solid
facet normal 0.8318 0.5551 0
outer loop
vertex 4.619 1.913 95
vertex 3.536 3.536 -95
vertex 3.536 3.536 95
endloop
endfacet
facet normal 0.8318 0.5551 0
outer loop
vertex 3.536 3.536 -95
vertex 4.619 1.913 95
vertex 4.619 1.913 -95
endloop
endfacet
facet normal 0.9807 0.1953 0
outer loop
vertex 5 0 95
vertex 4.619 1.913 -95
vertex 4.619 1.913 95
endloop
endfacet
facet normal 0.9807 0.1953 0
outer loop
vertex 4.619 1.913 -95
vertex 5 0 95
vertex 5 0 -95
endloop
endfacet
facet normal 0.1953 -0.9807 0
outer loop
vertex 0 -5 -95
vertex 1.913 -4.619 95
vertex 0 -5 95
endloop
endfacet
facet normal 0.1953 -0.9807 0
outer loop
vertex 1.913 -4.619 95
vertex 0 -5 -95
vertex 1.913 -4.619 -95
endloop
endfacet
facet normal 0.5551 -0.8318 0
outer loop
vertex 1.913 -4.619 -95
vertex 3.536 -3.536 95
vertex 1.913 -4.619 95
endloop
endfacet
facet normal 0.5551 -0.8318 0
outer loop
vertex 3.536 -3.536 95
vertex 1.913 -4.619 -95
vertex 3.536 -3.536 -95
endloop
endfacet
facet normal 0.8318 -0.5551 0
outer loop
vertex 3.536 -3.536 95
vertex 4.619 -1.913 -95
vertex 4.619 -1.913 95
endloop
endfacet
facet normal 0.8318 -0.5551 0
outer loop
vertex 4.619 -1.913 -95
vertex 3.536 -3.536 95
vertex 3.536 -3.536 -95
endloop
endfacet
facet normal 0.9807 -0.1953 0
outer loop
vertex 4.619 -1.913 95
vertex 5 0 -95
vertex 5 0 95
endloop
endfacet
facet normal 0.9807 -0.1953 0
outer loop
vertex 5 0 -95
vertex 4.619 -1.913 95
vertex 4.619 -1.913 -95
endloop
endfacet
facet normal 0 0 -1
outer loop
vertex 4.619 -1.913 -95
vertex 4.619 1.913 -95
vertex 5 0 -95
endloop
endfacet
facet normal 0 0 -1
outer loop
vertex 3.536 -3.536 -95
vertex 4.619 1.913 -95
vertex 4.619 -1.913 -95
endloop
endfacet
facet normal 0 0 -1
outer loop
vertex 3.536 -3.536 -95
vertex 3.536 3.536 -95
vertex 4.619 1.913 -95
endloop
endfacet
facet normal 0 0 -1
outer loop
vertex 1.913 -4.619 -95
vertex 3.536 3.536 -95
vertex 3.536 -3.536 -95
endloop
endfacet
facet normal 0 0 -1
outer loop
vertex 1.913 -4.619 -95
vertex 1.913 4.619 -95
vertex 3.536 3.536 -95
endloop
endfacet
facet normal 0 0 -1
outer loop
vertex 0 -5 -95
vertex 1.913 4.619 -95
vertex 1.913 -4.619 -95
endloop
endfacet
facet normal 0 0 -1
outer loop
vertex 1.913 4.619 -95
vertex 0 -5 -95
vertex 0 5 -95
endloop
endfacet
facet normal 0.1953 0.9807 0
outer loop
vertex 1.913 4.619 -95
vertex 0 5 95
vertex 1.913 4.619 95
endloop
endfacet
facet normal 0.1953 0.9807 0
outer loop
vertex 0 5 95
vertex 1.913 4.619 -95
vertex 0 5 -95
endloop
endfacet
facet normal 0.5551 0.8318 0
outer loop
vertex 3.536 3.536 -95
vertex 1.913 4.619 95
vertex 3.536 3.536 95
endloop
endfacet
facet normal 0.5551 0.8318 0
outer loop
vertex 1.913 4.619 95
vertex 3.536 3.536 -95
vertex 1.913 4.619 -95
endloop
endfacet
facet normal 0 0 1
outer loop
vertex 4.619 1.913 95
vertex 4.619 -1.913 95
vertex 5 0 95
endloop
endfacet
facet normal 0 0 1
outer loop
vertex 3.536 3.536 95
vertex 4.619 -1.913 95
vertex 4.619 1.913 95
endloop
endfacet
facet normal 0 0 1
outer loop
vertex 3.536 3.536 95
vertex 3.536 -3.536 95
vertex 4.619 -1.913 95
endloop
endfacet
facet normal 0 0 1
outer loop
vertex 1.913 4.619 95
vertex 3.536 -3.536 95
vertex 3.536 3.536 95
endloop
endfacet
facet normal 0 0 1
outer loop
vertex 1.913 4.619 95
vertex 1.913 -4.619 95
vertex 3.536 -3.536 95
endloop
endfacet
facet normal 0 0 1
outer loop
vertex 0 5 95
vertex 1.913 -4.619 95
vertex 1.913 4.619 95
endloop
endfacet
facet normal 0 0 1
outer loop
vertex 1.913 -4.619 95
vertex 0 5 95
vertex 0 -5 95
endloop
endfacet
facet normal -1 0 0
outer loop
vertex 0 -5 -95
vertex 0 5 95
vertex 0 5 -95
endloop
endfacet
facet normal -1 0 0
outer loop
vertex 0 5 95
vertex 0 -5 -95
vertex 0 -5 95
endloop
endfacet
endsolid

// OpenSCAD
module cylindrical_pole () {
difference () {
cylinder(h=190, r=5, center = true);

translate([-5,0,0])
cube([10,10,195], center = true);
}
}

cylindrical_pole ();
